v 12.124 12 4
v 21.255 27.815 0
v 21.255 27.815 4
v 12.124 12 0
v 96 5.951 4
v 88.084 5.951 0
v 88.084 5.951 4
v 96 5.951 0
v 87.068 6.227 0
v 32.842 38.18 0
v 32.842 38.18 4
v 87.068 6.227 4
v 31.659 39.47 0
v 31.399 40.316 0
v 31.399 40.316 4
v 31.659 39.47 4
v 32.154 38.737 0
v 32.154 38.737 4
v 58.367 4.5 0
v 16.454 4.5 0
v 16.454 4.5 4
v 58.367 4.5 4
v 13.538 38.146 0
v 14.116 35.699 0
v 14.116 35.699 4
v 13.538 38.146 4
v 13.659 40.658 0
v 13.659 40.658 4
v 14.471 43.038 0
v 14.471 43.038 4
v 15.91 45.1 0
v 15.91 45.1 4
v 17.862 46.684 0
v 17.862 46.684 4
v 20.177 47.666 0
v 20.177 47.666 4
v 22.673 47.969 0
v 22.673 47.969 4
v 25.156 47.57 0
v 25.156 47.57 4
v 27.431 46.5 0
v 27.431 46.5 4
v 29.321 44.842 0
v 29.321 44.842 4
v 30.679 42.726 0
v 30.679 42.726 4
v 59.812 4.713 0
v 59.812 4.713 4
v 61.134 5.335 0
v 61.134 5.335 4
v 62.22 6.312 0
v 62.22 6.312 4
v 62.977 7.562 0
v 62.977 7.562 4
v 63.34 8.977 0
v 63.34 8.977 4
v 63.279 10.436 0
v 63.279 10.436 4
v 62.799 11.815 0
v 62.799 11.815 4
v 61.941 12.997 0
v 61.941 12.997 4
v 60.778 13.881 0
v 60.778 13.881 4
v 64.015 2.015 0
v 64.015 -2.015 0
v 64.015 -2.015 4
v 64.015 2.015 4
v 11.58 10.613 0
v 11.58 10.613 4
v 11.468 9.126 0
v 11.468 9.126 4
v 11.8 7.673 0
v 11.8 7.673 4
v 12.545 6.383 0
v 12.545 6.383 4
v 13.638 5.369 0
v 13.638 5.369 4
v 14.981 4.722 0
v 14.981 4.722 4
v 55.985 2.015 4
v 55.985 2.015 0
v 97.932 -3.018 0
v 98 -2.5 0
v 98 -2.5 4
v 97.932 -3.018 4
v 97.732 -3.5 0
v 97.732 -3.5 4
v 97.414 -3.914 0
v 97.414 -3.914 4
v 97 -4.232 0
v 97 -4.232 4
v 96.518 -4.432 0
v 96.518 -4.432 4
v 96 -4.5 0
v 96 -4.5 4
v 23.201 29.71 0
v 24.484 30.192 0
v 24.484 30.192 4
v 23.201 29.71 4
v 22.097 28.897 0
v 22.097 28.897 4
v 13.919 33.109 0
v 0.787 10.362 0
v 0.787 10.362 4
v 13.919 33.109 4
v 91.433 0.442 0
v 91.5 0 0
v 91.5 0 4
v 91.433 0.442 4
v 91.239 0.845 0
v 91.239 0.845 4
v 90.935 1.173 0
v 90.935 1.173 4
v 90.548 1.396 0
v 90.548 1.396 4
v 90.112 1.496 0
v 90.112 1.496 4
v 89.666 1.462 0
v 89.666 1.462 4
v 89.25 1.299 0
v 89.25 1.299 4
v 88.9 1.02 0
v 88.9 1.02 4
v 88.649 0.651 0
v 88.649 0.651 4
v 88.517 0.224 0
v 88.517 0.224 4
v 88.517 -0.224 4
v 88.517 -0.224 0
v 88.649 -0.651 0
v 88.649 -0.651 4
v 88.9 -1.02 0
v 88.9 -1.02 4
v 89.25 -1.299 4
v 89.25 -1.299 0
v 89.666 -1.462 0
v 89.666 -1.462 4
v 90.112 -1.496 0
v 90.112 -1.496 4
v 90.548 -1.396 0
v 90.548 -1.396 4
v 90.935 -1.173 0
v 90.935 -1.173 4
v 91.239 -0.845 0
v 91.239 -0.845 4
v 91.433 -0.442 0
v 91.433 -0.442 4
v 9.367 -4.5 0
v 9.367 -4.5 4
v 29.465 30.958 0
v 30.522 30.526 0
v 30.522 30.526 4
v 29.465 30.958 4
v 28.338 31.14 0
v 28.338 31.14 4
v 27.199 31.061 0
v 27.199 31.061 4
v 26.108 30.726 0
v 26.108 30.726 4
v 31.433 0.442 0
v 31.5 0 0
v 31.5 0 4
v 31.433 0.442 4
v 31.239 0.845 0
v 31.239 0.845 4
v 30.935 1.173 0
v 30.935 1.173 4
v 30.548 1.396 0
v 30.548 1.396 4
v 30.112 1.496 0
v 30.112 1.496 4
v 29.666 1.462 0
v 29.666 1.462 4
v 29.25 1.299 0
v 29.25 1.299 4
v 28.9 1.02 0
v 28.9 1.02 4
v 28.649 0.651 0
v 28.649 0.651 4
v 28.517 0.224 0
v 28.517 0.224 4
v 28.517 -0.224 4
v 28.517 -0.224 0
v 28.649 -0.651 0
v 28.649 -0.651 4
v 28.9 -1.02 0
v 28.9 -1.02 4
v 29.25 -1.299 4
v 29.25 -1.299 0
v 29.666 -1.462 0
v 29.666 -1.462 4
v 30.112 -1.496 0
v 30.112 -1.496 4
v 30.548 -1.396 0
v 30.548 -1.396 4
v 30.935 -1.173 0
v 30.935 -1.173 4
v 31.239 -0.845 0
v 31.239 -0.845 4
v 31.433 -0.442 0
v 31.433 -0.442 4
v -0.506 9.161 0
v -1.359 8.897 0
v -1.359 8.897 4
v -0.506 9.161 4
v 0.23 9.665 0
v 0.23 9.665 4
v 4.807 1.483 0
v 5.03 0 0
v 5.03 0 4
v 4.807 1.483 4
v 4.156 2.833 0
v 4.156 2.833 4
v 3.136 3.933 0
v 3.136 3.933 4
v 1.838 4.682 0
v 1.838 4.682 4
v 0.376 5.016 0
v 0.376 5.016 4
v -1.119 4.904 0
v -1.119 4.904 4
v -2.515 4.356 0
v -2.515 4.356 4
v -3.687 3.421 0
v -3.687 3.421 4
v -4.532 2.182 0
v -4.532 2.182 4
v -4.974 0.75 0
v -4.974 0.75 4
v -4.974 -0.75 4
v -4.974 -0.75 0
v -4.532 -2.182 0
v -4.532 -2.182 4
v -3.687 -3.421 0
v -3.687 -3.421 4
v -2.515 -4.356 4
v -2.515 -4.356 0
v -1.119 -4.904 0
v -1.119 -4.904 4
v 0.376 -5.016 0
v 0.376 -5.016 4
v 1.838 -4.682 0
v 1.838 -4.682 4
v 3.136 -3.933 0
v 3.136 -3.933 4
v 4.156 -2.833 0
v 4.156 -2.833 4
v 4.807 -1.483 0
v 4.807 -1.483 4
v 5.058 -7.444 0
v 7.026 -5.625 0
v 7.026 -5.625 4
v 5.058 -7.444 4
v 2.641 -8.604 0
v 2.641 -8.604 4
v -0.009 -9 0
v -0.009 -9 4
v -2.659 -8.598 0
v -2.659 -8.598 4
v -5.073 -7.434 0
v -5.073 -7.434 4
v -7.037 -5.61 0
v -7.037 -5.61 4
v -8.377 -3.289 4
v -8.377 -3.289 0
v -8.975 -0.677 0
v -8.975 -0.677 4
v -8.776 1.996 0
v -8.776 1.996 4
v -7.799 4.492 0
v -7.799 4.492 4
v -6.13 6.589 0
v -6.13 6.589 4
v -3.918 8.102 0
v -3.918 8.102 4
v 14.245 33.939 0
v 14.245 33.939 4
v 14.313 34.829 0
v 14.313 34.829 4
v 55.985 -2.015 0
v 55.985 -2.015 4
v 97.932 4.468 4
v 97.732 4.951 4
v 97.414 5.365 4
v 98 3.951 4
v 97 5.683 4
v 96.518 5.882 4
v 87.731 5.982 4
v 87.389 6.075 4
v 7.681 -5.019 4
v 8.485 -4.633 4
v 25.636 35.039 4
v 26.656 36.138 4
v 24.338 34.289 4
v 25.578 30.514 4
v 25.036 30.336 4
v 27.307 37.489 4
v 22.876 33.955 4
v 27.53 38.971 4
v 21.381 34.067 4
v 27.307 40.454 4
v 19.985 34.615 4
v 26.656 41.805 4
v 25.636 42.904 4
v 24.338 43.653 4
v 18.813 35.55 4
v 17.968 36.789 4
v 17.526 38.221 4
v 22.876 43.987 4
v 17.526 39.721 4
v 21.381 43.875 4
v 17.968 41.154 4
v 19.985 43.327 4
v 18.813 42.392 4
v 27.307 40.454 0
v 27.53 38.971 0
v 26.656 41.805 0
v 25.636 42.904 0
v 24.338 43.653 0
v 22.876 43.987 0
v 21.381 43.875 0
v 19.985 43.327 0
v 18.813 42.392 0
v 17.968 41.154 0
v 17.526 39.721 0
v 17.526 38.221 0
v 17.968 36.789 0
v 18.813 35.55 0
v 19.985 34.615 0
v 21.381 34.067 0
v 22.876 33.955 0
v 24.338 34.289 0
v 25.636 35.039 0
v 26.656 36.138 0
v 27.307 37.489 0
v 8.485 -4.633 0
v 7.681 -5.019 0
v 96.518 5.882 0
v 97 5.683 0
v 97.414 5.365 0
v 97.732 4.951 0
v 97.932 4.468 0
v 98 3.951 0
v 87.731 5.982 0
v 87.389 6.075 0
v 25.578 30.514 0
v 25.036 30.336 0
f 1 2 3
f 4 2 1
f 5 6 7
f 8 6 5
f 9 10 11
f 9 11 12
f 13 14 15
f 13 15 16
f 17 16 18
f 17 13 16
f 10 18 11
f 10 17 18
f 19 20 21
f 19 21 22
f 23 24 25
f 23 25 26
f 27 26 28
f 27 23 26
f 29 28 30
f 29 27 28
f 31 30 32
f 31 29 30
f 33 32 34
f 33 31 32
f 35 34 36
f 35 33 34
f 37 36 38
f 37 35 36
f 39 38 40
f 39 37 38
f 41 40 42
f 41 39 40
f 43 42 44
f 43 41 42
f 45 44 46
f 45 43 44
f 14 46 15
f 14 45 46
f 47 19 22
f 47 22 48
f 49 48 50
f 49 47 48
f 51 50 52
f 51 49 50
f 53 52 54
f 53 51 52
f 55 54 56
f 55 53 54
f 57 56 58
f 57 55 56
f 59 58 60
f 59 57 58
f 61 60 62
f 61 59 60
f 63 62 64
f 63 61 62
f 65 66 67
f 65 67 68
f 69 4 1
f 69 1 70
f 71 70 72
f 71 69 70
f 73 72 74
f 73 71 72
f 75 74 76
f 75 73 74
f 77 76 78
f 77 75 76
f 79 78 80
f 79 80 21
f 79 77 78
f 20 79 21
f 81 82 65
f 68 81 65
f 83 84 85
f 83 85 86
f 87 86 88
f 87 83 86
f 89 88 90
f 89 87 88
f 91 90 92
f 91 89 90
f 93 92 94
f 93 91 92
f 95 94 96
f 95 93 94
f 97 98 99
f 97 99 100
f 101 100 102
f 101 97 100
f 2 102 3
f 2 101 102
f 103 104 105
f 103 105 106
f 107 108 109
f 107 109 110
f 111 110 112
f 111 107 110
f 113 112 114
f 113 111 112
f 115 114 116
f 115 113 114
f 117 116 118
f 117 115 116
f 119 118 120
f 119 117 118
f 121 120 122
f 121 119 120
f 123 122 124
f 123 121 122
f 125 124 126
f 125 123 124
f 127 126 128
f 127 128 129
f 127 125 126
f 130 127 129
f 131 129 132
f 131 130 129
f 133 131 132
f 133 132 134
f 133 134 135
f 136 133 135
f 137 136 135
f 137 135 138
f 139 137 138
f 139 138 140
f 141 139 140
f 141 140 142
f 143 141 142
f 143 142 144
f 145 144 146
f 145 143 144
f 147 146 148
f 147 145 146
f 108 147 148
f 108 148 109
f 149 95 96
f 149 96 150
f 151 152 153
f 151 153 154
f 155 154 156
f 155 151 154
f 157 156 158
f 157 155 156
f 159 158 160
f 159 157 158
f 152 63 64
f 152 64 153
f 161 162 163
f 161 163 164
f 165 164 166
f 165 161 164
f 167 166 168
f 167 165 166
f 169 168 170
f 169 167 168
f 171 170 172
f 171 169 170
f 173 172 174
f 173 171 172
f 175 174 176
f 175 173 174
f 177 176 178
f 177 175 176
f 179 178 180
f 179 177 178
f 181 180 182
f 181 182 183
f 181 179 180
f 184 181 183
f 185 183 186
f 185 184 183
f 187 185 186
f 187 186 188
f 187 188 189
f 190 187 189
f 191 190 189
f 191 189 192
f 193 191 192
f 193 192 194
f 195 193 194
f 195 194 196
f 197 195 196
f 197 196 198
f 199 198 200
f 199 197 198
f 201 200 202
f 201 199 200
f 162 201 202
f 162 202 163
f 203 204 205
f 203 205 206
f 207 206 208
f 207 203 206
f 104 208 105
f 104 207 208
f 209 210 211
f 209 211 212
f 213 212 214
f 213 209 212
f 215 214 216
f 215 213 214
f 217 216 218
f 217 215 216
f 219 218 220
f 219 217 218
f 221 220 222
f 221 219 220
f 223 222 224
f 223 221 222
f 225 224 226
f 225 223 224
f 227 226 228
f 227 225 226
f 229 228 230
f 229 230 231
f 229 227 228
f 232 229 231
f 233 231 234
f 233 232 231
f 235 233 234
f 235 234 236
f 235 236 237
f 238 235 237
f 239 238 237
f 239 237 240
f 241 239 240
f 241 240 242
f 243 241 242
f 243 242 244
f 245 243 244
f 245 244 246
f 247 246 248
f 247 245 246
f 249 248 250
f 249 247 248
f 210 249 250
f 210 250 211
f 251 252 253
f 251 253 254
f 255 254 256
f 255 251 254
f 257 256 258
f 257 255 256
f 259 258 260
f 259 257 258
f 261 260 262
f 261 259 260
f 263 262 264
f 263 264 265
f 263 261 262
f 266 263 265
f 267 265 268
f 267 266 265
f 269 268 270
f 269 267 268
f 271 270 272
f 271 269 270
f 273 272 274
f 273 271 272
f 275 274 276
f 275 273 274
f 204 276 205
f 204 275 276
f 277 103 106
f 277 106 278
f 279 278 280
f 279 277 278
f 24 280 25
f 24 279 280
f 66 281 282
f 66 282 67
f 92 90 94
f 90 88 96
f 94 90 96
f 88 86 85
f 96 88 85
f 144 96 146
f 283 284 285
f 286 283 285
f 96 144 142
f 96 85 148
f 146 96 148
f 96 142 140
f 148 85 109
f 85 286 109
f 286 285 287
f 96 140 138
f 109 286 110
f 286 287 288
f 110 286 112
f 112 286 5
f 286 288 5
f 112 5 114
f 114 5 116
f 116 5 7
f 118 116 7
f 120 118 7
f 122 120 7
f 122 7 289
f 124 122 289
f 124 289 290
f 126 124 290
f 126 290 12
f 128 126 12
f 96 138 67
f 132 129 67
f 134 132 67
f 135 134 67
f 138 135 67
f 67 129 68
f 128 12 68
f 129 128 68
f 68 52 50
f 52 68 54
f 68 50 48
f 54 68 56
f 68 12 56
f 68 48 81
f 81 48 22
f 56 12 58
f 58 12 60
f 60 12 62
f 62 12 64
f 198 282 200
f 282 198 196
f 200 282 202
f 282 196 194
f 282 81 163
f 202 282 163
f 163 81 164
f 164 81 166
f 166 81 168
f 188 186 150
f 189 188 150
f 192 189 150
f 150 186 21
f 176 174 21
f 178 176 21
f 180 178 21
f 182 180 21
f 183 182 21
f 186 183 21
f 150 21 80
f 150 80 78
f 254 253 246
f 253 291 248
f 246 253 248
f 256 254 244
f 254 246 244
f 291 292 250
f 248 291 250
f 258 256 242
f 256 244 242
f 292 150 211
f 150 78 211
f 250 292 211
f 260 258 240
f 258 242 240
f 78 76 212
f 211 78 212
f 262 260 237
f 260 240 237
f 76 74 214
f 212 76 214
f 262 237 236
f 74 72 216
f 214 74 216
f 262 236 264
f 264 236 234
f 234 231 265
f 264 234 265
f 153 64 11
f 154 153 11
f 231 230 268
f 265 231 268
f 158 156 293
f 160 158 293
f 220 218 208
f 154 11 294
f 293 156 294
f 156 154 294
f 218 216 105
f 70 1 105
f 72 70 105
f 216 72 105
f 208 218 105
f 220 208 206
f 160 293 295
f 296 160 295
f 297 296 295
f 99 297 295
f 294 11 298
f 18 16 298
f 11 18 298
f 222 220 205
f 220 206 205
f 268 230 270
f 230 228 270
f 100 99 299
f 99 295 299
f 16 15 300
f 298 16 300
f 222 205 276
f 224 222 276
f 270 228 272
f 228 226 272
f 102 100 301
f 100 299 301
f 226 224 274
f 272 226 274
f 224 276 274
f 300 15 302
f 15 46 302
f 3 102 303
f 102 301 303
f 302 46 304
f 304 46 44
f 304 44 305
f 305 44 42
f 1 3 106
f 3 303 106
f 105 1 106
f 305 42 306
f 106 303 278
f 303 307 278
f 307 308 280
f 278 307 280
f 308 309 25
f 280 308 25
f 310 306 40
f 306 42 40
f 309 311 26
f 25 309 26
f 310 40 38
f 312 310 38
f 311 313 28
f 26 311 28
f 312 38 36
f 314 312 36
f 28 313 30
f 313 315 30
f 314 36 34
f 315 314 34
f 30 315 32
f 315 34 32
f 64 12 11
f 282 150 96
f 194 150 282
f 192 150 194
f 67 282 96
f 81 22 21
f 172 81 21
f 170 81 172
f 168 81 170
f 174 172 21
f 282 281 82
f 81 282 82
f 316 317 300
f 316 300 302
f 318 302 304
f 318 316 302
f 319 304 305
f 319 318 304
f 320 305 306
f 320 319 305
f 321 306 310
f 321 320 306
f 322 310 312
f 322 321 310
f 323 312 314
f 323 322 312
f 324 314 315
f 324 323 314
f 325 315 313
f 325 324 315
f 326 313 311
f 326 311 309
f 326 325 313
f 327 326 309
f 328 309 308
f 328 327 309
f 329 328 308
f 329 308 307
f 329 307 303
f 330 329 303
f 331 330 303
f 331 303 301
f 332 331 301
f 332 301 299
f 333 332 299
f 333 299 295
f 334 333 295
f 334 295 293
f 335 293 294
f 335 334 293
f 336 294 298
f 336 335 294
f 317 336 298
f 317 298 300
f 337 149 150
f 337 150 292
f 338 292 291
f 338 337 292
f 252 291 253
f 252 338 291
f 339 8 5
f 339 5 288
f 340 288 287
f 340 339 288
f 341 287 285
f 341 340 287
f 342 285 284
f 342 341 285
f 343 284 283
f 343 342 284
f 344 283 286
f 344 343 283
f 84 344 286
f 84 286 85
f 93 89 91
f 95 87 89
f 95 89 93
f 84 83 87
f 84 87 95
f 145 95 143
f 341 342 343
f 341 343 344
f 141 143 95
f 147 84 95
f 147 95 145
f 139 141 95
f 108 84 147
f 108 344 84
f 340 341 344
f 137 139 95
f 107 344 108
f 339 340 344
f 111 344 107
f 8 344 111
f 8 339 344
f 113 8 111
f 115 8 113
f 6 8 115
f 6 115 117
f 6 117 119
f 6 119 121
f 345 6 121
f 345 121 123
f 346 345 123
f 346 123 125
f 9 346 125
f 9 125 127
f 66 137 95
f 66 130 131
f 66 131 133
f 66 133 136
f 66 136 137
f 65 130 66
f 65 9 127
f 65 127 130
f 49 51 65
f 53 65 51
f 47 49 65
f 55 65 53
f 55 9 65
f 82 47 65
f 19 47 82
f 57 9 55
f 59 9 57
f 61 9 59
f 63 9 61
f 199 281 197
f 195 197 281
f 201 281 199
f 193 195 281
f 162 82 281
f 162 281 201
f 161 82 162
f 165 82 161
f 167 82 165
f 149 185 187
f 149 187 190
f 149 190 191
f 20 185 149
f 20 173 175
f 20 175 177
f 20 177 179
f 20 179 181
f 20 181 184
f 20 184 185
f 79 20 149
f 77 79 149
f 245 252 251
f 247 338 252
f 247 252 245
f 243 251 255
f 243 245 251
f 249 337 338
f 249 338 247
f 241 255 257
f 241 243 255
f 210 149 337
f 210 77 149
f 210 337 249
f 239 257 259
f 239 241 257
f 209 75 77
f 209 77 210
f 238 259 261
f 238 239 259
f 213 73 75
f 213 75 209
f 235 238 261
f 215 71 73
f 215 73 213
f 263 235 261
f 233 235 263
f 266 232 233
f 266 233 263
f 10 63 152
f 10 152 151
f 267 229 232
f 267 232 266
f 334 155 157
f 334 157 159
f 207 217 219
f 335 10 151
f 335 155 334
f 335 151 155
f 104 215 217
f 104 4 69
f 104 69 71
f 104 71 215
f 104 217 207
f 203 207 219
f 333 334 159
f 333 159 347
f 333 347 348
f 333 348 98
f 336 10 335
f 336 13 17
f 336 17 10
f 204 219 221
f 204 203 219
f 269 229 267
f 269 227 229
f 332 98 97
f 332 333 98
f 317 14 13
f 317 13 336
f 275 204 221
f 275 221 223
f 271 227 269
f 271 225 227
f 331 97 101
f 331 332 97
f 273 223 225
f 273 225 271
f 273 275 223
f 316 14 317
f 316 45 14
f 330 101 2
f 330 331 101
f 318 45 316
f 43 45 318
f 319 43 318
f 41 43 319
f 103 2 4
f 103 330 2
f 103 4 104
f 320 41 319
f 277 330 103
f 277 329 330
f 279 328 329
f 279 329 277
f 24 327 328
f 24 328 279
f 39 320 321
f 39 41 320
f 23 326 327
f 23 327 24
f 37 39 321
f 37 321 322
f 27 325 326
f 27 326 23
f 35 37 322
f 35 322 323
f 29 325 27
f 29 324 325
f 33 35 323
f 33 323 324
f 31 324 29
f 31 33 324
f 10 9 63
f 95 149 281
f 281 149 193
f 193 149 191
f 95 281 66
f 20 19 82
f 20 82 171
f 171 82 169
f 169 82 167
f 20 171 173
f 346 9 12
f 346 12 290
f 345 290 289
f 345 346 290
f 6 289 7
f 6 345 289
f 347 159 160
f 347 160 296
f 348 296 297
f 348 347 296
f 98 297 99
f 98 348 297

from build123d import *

# Parameters (mm, degrees)
SKETCH_1_R      = 5.03
SKETCH_1_R_2    = 1.5
SKETCH_1_W      = 8.03
SKETCH_1_H      = 4.03
EXTRUDE_1_DEPTH = 4


with BuildPart() as part:
    # 草图1 → 凸台-拉伸1 (new body)
    with BuildSketch(Plane.XY):
        with BuildLine():
            Line((87, -4.5), (9.367496998, -4.5))
            ThreePointArc((9.367496998, -4.5), (8.068458892, -4.795836543), (7.025622748, -5.625))
            ThreePointArc((7.025622748, -5.625), (-7.794228634, -4.5), (-1.358581522, 8.896867777))
            ThreePointArc((-1.358581522, 8.896867777), (-0.119086833, 9.385408641), (0.786634182, 10.36249037))
            Line((0.786634182, 10.36249037), (13.919137184, 33.108652801))
            ThreePointArc((13.919137184, 33.108652801), (14.312454275, 34.381571072), (14.11579573, 35.699275393))
            ThreePointArc((14.11579573, 35.699275393), (20.177098522, 47.666206639), (31.398879943, 40.316481698))
            ThreePointArc((31.398879943, 40.316481698), (31.879352208, 39.085435776), (32.842164256, 38.180272466))
            Line((32.842164256, 38.180272466), (87.068435314, 6.227425402))
            ThreePointArc((87.068435314, 6.227425402), (87.55756519, 6.02099445), (88.083774649, 5.950529007))
            Line((88.083774649, 5.950529007), (96, 5.950529007))
            ThreePointArc((96, 5.950529007), (97.414213562, 5.364742569), (98, 3.950529007))
            Line((98, 3.950529007), (98, 0))
            Line((98, 0), (98, -2.5))
            ThreePointArc((98, -2.5), (97.414213562, -3.914213562), (96, -4.5))
            Line((96, -4.5), (87, -4.5))
        make_face()
        Circle(SKETCH_1_R, mode=Mode.SUBTRACT)
        with Locations((22.5, 38.97114317)):
            Circle(SKETCH_1_R, mode=Mode.SUBTRACT)
        with Locations((30, 0)):
            Circle(SKETCH_1_R_2, mode=Mode.SUBTRACT)
        with Locations((90, 0)):
            Circle(SKETCH_1_R_2, mode=Mode.SUBTRACT)
        with Locations((60, 0)):
            Rectangle(SKETCH_1_W, SKETCH_1_H, mode=Mode.SUBTRACT)
        with BuildLine():
            Line((21.255373367, 27.815386605), (12.124355653, 12))
            ThreePointArc((12.124355653, 12), (12.124355653, 7), (16.454482672, 4.5))
            Line((16.454482672, 4.5), (58.367468971, 4.5))
            ThreePointArc((58.367468971, 4.5), (63.210197148, 8.25582003), (60.777559131, 13.880806481))
            Line((60.777559131, 13.880806481), (30.521886072, 30.525892321))
            ThreePointArc((30.521886072, 30.525892321), (28.338019103, 31.139965525), (26.107583087, 30.725820601))
            ThreePointArc((26.107583087, 30.725820601), (25.308251431, 30.420486827), (24.483535962, 30.192442521))
            ThreePointArc((24.483535962, 30.192442521), (22.620790776, 29.341612745), (21.255373367, 27.815386605))
        make_face(mode=Mode.SUBTRACT)
    extrude(amount=EXTRUDE_1_DEPTH)


solid = part.part
